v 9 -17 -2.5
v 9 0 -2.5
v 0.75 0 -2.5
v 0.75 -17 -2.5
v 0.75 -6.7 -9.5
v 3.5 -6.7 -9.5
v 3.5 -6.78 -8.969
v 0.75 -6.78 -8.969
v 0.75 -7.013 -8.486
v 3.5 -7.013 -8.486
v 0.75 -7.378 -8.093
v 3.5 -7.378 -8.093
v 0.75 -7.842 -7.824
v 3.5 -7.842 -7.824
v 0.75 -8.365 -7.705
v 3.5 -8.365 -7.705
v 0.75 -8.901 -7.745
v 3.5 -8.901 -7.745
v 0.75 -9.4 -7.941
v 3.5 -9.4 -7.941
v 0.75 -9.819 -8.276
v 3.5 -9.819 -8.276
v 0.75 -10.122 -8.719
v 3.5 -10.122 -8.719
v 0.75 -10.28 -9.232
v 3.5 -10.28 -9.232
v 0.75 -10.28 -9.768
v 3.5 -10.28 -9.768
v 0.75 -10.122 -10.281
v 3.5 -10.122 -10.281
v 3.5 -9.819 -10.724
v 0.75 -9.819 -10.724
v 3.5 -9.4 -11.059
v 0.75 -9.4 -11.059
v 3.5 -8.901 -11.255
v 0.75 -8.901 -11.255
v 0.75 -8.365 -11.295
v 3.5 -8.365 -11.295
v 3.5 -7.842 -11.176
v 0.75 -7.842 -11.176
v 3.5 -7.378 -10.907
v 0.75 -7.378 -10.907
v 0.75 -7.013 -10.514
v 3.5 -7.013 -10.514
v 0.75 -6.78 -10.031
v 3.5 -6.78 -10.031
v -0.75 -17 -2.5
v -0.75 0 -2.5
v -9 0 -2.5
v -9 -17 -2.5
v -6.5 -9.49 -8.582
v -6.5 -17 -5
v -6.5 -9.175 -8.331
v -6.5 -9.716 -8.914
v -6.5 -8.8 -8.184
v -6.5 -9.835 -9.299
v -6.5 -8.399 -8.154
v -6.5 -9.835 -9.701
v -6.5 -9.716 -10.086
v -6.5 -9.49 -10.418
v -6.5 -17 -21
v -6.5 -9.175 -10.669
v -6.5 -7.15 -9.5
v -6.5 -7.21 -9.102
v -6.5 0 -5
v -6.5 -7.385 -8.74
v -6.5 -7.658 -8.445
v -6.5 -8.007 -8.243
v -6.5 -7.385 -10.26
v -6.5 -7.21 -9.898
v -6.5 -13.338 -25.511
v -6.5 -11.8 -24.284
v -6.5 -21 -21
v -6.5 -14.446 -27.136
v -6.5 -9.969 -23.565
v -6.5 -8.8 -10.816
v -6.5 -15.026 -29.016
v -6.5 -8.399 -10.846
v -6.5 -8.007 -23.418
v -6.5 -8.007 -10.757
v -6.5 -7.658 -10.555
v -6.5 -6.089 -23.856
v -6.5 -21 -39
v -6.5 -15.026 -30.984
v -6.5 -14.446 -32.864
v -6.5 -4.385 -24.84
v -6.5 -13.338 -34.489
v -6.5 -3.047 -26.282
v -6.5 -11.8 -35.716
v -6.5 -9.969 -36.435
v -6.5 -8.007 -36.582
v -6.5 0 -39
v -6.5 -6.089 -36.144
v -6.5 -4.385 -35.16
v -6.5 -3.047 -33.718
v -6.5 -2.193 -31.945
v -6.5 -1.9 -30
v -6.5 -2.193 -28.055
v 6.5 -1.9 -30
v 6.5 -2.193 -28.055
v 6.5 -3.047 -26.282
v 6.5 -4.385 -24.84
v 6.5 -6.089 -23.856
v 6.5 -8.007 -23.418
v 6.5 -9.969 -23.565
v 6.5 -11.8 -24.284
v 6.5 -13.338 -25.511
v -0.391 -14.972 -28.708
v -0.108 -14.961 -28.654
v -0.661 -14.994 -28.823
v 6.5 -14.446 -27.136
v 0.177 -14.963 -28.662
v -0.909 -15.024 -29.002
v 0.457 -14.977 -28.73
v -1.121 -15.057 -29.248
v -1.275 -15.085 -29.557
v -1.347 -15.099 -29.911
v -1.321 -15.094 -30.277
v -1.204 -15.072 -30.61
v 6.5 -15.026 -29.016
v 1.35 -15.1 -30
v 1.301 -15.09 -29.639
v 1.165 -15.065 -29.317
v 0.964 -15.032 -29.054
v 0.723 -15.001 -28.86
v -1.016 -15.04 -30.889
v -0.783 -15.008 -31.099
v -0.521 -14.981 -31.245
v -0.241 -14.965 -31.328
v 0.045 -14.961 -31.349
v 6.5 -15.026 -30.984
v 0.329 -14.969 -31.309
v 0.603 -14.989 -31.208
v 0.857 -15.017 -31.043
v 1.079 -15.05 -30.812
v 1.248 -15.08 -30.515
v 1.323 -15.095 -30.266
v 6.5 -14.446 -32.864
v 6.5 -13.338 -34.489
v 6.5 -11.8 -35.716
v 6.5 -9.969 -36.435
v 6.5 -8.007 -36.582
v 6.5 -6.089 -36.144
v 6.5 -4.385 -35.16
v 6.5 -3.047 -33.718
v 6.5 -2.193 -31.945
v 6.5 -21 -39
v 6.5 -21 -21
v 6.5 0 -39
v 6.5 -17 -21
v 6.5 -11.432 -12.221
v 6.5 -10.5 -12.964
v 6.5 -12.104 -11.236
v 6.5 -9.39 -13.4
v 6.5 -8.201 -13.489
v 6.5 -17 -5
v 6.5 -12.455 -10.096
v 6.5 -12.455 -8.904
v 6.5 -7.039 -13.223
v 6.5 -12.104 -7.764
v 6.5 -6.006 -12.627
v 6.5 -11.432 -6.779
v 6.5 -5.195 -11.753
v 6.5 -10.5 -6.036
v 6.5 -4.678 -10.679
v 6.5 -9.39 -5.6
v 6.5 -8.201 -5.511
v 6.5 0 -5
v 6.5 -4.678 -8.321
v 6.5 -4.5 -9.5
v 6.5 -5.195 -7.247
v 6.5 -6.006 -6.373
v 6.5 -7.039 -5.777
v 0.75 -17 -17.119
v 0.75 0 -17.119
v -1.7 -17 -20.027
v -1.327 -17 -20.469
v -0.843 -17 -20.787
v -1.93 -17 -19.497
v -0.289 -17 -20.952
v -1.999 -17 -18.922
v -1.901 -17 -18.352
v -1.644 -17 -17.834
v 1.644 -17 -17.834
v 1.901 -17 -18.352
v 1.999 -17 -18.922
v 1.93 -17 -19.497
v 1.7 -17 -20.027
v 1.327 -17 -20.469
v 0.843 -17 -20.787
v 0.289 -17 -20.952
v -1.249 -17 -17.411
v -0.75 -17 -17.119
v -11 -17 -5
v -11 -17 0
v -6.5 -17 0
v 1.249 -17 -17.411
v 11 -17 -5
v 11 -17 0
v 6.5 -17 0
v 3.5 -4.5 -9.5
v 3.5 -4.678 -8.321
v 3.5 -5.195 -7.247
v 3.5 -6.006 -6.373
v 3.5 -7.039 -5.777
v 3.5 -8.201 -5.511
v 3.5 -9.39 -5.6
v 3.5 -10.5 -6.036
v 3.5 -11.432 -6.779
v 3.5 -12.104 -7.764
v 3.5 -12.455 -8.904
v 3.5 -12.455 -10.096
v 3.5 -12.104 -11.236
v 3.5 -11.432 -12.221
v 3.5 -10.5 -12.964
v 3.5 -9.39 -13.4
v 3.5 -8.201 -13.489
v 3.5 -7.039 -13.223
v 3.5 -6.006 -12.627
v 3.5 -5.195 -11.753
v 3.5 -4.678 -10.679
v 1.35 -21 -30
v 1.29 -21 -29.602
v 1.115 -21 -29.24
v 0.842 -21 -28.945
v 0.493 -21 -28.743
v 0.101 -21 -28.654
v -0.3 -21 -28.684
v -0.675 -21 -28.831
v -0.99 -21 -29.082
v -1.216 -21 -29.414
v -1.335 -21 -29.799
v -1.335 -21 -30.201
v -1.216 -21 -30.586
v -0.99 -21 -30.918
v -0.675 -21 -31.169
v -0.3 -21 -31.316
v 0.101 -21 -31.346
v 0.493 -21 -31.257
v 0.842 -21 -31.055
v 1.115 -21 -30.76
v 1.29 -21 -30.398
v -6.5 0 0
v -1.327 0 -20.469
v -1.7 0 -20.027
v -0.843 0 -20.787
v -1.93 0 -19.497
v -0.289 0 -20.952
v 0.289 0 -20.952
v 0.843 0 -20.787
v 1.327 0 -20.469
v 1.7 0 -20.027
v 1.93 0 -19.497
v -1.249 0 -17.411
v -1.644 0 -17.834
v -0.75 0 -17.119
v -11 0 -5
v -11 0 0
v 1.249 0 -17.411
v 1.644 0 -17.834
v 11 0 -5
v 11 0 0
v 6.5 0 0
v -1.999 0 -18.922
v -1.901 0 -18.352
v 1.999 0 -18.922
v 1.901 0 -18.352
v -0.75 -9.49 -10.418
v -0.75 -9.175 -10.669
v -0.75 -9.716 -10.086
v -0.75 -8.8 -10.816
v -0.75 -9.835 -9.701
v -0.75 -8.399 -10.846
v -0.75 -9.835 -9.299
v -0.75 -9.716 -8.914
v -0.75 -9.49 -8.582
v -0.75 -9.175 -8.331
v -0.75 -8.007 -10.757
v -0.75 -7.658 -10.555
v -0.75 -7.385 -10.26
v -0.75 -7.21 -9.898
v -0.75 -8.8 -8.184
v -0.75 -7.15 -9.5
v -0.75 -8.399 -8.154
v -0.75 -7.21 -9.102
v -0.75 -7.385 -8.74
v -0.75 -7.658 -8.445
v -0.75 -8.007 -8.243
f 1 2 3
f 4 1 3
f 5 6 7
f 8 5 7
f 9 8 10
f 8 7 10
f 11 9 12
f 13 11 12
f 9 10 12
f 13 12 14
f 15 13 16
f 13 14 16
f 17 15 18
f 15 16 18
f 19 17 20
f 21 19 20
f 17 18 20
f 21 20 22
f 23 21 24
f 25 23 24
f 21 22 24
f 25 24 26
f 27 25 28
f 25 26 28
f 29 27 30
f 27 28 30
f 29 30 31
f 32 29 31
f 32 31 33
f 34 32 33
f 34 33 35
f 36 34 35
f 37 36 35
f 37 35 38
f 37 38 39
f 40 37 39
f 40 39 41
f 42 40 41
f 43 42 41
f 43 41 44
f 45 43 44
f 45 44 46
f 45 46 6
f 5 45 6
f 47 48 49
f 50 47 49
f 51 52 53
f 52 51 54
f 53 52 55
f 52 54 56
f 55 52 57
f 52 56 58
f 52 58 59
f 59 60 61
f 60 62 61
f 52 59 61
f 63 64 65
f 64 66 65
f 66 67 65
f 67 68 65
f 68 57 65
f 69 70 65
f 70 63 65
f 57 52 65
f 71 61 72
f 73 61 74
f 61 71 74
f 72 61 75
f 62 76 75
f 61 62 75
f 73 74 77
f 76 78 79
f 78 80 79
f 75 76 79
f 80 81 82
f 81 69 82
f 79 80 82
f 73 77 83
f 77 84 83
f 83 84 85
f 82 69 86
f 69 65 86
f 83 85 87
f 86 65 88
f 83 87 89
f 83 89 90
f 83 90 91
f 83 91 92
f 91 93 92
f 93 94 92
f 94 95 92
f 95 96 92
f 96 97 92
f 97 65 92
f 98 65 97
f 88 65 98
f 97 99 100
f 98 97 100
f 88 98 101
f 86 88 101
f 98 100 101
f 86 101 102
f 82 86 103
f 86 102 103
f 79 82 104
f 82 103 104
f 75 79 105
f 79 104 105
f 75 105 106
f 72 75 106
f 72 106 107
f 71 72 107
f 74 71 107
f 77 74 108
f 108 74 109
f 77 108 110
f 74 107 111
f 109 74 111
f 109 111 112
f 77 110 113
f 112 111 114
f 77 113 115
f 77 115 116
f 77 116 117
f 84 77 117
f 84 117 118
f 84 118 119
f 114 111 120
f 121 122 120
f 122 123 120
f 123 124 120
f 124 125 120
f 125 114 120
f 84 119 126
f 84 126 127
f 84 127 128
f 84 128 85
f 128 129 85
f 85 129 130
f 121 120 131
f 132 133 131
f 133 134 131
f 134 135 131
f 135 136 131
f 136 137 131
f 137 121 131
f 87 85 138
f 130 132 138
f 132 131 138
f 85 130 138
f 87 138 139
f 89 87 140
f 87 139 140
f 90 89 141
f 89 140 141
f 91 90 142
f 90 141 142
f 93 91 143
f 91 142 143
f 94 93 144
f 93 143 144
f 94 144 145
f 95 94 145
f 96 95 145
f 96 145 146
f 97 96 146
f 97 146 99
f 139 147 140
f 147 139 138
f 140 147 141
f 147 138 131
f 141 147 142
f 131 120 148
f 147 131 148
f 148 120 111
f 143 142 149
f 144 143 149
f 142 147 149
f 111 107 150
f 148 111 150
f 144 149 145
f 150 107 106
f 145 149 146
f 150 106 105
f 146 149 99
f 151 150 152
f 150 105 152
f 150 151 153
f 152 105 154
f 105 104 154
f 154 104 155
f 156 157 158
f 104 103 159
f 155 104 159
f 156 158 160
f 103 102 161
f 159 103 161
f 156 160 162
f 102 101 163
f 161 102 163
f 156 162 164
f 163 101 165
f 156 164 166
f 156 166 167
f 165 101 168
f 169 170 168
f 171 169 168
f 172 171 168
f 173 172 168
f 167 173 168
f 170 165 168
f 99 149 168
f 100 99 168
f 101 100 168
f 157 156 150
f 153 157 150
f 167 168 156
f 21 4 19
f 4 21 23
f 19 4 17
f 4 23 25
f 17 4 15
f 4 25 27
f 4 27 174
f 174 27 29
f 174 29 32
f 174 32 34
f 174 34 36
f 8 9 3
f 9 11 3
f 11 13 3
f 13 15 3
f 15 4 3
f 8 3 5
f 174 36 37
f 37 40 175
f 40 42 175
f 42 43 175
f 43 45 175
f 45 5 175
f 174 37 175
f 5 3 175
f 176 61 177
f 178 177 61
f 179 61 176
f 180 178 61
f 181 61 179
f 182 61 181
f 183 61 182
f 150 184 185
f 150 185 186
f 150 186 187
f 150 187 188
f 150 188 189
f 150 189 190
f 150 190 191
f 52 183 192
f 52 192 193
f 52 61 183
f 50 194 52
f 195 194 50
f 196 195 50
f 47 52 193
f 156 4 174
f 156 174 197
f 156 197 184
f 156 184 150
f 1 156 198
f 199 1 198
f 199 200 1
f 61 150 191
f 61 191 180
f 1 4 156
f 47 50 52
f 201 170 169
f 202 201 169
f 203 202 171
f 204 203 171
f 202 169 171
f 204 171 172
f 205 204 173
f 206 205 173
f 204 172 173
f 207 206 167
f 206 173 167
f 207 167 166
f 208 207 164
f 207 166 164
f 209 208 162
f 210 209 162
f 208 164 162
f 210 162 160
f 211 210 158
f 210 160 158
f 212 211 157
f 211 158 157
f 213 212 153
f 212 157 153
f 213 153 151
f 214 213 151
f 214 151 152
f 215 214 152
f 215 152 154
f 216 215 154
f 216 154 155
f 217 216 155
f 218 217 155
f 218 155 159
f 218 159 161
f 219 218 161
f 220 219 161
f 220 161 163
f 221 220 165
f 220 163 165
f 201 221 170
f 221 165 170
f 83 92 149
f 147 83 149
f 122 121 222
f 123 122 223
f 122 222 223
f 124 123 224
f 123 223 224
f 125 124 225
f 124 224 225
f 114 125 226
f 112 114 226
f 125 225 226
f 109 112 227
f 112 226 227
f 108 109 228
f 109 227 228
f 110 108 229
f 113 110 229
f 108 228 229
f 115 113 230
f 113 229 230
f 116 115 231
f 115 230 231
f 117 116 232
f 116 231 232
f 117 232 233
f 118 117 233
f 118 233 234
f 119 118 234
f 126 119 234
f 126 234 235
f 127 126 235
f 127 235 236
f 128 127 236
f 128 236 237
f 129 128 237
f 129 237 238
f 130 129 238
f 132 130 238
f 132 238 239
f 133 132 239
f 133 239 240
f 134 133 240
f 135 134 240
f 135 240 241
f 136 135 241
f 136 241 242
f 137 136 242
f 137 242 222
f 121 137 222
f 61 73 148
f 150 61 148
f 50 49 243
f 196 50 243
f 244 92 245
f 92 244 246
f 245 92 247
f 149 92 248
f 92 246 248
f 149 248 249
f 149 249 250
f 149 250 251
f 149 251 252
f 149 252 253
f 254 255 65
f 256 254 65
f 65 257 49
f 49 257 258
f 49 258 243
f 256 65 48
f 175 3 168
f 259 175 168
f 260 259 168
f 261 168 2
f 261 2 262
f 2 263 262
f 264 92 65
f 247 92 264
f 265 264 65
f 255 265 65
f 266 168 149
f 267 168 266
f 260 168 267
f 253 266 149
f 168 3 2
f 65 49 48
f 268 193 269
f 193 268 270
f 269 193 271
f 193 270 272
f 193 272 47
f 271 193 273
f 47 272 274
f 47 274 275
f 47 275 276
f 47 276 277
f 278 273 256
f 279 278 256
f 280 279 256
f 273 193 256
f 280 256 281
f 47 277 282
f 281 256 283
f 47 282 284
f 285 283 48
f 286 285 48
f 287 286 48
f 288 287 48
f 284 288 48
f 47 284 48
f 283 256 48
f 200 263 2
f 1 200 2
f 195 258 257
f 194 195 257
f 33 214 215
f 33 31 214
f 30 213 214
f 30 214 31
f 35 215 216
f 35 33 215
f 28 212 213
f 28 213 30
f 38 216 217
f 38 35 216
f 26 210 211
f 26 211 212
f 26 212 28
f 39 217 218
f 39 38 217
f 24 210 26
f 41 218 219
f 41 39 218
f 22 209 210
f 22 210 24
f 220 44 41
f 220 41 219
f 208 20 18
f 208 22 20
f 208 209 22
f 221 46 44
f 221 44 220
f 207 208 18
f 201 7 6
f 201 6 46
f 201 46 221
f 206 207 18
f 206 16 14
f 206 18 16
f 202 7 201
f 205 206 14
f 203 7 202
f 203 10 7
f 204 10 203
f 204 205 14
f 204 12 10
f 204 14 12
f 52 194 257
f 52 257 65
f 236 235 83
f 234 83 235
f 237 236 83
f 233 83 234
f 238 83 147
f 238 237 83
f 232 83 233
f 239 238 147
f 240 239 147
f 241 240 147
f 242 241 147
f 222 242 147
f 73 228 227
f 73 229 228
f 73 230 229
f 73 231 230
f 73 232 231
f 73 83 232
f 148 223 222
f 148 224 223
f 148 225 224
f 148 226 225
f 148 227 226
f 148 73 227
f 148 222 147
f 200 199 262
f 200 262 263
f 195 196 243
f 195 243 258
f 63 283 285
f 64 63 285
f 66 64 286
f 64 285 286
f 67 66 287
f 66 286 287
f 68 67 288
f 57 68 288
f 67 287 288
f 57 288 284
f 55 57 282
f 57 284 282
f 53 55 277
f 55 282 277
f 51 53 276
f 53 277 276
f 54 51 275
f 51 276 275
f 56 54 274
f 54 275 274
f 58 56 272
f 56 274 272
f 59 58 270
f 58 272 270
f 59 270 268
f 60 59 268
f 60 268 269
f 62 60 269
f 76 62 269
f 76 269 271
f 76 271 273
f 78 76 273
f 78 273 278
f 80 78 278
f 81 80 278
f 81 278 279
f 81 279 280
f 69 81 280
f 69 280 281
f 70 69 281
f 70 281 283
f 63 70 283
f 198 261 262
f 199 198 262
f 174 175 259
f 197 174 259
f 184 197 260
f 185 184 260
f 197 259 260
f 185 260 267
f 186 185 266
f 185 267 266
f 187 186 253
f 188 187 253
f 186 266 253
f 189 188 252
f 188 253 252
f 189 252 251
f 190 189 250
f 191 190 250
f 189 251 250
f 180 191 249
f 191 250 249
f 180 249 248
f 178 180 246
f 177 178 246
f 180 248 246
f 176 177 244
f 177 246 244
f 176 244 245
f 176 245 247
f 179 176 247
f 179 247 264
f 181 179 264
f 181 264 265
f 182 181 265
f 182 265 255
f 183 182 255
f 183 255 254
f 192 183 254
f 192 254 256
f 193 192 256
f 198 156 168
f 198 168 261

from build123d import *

# Parameters (mm, degrees)
F1_DEPTH  = 21
F2_W      = 22
F2_H      = 21
F3_DEPTH  = 4
F4_R      = 6.6
F4_R_2    = 1.35
F5_DEPTH  = 17.501
F6_R      = 1.8
F7_DEPTH  = 7
F8_R      = 4
F9_DEPTH  = 3
F10_R     = 1.35
F11_DEPTH = 12


# Not quite as in the source:
# - a feature names something its author has since deleted; it is built from what else it names


with BuildPart() as f1:
    # F0 (on Front) → F1 (new body)
    with BuildSketch(Plane.XZ):
        with BuildLine():
            Line((-9, -2.5), (-6.5, 0))
            Line((-6.5, 0), (-11, 0))
            Line((-11, 0), (-11, -5))
            Line((-11, -5), (-6.5, -5))
            Line((-6.5, -5), (-6.5, -39))
            Line((-6.5, -39), (6.5, -39))
            Line((6.5, -39), (6.5, -5))
            Line((6.5, -5), (11, -5))
            Line((11, -5), (11, 0))
            Line((11, 0), (6.5, 0))
            Line((6.5, 0), (9, -2.5))
            Line((9, -2.5), (0.75, -2.5))
            Line((0.75, -2.5), (0.75, -17.11916493))
            ThreePointArc((0.75, -17.11916493), (0, -20.9732145518), (-0.75, -17.11916493))
            Line((-0.75, -17.11916493), (-0.75, -2.5))
            Line((-0.75, -2.5), (-9, -2.5))
        make_face()
    extrude(amount=F1_DEPTH)

    # F2 (on face) → F3 (cut)
    with BuildSketch(Plane.XZ.offset(21)):
        with Locations((0, -10.5)):
            Rectangle(F2_W, F2_H)
    extrude(amount=-F3_DEPTH, mode=Mode.SUBTRACT)

    # F4 (on face) → F5 (cut, through all)
    with BuildSketch(Plane.YZ.offset(6.5)):
        with Locations((-8.5, -30)):
            Circle(F4_R)
        with Locations((-8.5, -9.5)):
            Circle(F4_R_2)
    extrude(amount=-F5_DEPTH, mode=Mode.SUBTRACT)

    # F6 (on face) → F7 (cut)
    with BuildSketch(Plane.YZ.offset(6.5)):
        with Locations((-8.5, -9.5)):
            Circle(F6_R)
    extrude(amount=-F7_DEPTH, mode=Mode.SUBTRACT)

    # F8 (on face) → F9 (cut)
    with BuildSketch(Plane.YZ.offset(6.5)):
        with Locations((-8.5, -9.5)):
            Circle(F8_R)
    extrude(amount=-F9_DEPTH, mode=Mode.SUBTRACT)

    # F10 (on face) → F11 (cut)
    with BuildSketch(Plane.XZ.offset(21)):
        with Locations((0, -30)):
            Circle(F10_R)
    extrude(amount=-F11_DEPTH, mode=Mode.SUBTRACT)


solid = f1.part
